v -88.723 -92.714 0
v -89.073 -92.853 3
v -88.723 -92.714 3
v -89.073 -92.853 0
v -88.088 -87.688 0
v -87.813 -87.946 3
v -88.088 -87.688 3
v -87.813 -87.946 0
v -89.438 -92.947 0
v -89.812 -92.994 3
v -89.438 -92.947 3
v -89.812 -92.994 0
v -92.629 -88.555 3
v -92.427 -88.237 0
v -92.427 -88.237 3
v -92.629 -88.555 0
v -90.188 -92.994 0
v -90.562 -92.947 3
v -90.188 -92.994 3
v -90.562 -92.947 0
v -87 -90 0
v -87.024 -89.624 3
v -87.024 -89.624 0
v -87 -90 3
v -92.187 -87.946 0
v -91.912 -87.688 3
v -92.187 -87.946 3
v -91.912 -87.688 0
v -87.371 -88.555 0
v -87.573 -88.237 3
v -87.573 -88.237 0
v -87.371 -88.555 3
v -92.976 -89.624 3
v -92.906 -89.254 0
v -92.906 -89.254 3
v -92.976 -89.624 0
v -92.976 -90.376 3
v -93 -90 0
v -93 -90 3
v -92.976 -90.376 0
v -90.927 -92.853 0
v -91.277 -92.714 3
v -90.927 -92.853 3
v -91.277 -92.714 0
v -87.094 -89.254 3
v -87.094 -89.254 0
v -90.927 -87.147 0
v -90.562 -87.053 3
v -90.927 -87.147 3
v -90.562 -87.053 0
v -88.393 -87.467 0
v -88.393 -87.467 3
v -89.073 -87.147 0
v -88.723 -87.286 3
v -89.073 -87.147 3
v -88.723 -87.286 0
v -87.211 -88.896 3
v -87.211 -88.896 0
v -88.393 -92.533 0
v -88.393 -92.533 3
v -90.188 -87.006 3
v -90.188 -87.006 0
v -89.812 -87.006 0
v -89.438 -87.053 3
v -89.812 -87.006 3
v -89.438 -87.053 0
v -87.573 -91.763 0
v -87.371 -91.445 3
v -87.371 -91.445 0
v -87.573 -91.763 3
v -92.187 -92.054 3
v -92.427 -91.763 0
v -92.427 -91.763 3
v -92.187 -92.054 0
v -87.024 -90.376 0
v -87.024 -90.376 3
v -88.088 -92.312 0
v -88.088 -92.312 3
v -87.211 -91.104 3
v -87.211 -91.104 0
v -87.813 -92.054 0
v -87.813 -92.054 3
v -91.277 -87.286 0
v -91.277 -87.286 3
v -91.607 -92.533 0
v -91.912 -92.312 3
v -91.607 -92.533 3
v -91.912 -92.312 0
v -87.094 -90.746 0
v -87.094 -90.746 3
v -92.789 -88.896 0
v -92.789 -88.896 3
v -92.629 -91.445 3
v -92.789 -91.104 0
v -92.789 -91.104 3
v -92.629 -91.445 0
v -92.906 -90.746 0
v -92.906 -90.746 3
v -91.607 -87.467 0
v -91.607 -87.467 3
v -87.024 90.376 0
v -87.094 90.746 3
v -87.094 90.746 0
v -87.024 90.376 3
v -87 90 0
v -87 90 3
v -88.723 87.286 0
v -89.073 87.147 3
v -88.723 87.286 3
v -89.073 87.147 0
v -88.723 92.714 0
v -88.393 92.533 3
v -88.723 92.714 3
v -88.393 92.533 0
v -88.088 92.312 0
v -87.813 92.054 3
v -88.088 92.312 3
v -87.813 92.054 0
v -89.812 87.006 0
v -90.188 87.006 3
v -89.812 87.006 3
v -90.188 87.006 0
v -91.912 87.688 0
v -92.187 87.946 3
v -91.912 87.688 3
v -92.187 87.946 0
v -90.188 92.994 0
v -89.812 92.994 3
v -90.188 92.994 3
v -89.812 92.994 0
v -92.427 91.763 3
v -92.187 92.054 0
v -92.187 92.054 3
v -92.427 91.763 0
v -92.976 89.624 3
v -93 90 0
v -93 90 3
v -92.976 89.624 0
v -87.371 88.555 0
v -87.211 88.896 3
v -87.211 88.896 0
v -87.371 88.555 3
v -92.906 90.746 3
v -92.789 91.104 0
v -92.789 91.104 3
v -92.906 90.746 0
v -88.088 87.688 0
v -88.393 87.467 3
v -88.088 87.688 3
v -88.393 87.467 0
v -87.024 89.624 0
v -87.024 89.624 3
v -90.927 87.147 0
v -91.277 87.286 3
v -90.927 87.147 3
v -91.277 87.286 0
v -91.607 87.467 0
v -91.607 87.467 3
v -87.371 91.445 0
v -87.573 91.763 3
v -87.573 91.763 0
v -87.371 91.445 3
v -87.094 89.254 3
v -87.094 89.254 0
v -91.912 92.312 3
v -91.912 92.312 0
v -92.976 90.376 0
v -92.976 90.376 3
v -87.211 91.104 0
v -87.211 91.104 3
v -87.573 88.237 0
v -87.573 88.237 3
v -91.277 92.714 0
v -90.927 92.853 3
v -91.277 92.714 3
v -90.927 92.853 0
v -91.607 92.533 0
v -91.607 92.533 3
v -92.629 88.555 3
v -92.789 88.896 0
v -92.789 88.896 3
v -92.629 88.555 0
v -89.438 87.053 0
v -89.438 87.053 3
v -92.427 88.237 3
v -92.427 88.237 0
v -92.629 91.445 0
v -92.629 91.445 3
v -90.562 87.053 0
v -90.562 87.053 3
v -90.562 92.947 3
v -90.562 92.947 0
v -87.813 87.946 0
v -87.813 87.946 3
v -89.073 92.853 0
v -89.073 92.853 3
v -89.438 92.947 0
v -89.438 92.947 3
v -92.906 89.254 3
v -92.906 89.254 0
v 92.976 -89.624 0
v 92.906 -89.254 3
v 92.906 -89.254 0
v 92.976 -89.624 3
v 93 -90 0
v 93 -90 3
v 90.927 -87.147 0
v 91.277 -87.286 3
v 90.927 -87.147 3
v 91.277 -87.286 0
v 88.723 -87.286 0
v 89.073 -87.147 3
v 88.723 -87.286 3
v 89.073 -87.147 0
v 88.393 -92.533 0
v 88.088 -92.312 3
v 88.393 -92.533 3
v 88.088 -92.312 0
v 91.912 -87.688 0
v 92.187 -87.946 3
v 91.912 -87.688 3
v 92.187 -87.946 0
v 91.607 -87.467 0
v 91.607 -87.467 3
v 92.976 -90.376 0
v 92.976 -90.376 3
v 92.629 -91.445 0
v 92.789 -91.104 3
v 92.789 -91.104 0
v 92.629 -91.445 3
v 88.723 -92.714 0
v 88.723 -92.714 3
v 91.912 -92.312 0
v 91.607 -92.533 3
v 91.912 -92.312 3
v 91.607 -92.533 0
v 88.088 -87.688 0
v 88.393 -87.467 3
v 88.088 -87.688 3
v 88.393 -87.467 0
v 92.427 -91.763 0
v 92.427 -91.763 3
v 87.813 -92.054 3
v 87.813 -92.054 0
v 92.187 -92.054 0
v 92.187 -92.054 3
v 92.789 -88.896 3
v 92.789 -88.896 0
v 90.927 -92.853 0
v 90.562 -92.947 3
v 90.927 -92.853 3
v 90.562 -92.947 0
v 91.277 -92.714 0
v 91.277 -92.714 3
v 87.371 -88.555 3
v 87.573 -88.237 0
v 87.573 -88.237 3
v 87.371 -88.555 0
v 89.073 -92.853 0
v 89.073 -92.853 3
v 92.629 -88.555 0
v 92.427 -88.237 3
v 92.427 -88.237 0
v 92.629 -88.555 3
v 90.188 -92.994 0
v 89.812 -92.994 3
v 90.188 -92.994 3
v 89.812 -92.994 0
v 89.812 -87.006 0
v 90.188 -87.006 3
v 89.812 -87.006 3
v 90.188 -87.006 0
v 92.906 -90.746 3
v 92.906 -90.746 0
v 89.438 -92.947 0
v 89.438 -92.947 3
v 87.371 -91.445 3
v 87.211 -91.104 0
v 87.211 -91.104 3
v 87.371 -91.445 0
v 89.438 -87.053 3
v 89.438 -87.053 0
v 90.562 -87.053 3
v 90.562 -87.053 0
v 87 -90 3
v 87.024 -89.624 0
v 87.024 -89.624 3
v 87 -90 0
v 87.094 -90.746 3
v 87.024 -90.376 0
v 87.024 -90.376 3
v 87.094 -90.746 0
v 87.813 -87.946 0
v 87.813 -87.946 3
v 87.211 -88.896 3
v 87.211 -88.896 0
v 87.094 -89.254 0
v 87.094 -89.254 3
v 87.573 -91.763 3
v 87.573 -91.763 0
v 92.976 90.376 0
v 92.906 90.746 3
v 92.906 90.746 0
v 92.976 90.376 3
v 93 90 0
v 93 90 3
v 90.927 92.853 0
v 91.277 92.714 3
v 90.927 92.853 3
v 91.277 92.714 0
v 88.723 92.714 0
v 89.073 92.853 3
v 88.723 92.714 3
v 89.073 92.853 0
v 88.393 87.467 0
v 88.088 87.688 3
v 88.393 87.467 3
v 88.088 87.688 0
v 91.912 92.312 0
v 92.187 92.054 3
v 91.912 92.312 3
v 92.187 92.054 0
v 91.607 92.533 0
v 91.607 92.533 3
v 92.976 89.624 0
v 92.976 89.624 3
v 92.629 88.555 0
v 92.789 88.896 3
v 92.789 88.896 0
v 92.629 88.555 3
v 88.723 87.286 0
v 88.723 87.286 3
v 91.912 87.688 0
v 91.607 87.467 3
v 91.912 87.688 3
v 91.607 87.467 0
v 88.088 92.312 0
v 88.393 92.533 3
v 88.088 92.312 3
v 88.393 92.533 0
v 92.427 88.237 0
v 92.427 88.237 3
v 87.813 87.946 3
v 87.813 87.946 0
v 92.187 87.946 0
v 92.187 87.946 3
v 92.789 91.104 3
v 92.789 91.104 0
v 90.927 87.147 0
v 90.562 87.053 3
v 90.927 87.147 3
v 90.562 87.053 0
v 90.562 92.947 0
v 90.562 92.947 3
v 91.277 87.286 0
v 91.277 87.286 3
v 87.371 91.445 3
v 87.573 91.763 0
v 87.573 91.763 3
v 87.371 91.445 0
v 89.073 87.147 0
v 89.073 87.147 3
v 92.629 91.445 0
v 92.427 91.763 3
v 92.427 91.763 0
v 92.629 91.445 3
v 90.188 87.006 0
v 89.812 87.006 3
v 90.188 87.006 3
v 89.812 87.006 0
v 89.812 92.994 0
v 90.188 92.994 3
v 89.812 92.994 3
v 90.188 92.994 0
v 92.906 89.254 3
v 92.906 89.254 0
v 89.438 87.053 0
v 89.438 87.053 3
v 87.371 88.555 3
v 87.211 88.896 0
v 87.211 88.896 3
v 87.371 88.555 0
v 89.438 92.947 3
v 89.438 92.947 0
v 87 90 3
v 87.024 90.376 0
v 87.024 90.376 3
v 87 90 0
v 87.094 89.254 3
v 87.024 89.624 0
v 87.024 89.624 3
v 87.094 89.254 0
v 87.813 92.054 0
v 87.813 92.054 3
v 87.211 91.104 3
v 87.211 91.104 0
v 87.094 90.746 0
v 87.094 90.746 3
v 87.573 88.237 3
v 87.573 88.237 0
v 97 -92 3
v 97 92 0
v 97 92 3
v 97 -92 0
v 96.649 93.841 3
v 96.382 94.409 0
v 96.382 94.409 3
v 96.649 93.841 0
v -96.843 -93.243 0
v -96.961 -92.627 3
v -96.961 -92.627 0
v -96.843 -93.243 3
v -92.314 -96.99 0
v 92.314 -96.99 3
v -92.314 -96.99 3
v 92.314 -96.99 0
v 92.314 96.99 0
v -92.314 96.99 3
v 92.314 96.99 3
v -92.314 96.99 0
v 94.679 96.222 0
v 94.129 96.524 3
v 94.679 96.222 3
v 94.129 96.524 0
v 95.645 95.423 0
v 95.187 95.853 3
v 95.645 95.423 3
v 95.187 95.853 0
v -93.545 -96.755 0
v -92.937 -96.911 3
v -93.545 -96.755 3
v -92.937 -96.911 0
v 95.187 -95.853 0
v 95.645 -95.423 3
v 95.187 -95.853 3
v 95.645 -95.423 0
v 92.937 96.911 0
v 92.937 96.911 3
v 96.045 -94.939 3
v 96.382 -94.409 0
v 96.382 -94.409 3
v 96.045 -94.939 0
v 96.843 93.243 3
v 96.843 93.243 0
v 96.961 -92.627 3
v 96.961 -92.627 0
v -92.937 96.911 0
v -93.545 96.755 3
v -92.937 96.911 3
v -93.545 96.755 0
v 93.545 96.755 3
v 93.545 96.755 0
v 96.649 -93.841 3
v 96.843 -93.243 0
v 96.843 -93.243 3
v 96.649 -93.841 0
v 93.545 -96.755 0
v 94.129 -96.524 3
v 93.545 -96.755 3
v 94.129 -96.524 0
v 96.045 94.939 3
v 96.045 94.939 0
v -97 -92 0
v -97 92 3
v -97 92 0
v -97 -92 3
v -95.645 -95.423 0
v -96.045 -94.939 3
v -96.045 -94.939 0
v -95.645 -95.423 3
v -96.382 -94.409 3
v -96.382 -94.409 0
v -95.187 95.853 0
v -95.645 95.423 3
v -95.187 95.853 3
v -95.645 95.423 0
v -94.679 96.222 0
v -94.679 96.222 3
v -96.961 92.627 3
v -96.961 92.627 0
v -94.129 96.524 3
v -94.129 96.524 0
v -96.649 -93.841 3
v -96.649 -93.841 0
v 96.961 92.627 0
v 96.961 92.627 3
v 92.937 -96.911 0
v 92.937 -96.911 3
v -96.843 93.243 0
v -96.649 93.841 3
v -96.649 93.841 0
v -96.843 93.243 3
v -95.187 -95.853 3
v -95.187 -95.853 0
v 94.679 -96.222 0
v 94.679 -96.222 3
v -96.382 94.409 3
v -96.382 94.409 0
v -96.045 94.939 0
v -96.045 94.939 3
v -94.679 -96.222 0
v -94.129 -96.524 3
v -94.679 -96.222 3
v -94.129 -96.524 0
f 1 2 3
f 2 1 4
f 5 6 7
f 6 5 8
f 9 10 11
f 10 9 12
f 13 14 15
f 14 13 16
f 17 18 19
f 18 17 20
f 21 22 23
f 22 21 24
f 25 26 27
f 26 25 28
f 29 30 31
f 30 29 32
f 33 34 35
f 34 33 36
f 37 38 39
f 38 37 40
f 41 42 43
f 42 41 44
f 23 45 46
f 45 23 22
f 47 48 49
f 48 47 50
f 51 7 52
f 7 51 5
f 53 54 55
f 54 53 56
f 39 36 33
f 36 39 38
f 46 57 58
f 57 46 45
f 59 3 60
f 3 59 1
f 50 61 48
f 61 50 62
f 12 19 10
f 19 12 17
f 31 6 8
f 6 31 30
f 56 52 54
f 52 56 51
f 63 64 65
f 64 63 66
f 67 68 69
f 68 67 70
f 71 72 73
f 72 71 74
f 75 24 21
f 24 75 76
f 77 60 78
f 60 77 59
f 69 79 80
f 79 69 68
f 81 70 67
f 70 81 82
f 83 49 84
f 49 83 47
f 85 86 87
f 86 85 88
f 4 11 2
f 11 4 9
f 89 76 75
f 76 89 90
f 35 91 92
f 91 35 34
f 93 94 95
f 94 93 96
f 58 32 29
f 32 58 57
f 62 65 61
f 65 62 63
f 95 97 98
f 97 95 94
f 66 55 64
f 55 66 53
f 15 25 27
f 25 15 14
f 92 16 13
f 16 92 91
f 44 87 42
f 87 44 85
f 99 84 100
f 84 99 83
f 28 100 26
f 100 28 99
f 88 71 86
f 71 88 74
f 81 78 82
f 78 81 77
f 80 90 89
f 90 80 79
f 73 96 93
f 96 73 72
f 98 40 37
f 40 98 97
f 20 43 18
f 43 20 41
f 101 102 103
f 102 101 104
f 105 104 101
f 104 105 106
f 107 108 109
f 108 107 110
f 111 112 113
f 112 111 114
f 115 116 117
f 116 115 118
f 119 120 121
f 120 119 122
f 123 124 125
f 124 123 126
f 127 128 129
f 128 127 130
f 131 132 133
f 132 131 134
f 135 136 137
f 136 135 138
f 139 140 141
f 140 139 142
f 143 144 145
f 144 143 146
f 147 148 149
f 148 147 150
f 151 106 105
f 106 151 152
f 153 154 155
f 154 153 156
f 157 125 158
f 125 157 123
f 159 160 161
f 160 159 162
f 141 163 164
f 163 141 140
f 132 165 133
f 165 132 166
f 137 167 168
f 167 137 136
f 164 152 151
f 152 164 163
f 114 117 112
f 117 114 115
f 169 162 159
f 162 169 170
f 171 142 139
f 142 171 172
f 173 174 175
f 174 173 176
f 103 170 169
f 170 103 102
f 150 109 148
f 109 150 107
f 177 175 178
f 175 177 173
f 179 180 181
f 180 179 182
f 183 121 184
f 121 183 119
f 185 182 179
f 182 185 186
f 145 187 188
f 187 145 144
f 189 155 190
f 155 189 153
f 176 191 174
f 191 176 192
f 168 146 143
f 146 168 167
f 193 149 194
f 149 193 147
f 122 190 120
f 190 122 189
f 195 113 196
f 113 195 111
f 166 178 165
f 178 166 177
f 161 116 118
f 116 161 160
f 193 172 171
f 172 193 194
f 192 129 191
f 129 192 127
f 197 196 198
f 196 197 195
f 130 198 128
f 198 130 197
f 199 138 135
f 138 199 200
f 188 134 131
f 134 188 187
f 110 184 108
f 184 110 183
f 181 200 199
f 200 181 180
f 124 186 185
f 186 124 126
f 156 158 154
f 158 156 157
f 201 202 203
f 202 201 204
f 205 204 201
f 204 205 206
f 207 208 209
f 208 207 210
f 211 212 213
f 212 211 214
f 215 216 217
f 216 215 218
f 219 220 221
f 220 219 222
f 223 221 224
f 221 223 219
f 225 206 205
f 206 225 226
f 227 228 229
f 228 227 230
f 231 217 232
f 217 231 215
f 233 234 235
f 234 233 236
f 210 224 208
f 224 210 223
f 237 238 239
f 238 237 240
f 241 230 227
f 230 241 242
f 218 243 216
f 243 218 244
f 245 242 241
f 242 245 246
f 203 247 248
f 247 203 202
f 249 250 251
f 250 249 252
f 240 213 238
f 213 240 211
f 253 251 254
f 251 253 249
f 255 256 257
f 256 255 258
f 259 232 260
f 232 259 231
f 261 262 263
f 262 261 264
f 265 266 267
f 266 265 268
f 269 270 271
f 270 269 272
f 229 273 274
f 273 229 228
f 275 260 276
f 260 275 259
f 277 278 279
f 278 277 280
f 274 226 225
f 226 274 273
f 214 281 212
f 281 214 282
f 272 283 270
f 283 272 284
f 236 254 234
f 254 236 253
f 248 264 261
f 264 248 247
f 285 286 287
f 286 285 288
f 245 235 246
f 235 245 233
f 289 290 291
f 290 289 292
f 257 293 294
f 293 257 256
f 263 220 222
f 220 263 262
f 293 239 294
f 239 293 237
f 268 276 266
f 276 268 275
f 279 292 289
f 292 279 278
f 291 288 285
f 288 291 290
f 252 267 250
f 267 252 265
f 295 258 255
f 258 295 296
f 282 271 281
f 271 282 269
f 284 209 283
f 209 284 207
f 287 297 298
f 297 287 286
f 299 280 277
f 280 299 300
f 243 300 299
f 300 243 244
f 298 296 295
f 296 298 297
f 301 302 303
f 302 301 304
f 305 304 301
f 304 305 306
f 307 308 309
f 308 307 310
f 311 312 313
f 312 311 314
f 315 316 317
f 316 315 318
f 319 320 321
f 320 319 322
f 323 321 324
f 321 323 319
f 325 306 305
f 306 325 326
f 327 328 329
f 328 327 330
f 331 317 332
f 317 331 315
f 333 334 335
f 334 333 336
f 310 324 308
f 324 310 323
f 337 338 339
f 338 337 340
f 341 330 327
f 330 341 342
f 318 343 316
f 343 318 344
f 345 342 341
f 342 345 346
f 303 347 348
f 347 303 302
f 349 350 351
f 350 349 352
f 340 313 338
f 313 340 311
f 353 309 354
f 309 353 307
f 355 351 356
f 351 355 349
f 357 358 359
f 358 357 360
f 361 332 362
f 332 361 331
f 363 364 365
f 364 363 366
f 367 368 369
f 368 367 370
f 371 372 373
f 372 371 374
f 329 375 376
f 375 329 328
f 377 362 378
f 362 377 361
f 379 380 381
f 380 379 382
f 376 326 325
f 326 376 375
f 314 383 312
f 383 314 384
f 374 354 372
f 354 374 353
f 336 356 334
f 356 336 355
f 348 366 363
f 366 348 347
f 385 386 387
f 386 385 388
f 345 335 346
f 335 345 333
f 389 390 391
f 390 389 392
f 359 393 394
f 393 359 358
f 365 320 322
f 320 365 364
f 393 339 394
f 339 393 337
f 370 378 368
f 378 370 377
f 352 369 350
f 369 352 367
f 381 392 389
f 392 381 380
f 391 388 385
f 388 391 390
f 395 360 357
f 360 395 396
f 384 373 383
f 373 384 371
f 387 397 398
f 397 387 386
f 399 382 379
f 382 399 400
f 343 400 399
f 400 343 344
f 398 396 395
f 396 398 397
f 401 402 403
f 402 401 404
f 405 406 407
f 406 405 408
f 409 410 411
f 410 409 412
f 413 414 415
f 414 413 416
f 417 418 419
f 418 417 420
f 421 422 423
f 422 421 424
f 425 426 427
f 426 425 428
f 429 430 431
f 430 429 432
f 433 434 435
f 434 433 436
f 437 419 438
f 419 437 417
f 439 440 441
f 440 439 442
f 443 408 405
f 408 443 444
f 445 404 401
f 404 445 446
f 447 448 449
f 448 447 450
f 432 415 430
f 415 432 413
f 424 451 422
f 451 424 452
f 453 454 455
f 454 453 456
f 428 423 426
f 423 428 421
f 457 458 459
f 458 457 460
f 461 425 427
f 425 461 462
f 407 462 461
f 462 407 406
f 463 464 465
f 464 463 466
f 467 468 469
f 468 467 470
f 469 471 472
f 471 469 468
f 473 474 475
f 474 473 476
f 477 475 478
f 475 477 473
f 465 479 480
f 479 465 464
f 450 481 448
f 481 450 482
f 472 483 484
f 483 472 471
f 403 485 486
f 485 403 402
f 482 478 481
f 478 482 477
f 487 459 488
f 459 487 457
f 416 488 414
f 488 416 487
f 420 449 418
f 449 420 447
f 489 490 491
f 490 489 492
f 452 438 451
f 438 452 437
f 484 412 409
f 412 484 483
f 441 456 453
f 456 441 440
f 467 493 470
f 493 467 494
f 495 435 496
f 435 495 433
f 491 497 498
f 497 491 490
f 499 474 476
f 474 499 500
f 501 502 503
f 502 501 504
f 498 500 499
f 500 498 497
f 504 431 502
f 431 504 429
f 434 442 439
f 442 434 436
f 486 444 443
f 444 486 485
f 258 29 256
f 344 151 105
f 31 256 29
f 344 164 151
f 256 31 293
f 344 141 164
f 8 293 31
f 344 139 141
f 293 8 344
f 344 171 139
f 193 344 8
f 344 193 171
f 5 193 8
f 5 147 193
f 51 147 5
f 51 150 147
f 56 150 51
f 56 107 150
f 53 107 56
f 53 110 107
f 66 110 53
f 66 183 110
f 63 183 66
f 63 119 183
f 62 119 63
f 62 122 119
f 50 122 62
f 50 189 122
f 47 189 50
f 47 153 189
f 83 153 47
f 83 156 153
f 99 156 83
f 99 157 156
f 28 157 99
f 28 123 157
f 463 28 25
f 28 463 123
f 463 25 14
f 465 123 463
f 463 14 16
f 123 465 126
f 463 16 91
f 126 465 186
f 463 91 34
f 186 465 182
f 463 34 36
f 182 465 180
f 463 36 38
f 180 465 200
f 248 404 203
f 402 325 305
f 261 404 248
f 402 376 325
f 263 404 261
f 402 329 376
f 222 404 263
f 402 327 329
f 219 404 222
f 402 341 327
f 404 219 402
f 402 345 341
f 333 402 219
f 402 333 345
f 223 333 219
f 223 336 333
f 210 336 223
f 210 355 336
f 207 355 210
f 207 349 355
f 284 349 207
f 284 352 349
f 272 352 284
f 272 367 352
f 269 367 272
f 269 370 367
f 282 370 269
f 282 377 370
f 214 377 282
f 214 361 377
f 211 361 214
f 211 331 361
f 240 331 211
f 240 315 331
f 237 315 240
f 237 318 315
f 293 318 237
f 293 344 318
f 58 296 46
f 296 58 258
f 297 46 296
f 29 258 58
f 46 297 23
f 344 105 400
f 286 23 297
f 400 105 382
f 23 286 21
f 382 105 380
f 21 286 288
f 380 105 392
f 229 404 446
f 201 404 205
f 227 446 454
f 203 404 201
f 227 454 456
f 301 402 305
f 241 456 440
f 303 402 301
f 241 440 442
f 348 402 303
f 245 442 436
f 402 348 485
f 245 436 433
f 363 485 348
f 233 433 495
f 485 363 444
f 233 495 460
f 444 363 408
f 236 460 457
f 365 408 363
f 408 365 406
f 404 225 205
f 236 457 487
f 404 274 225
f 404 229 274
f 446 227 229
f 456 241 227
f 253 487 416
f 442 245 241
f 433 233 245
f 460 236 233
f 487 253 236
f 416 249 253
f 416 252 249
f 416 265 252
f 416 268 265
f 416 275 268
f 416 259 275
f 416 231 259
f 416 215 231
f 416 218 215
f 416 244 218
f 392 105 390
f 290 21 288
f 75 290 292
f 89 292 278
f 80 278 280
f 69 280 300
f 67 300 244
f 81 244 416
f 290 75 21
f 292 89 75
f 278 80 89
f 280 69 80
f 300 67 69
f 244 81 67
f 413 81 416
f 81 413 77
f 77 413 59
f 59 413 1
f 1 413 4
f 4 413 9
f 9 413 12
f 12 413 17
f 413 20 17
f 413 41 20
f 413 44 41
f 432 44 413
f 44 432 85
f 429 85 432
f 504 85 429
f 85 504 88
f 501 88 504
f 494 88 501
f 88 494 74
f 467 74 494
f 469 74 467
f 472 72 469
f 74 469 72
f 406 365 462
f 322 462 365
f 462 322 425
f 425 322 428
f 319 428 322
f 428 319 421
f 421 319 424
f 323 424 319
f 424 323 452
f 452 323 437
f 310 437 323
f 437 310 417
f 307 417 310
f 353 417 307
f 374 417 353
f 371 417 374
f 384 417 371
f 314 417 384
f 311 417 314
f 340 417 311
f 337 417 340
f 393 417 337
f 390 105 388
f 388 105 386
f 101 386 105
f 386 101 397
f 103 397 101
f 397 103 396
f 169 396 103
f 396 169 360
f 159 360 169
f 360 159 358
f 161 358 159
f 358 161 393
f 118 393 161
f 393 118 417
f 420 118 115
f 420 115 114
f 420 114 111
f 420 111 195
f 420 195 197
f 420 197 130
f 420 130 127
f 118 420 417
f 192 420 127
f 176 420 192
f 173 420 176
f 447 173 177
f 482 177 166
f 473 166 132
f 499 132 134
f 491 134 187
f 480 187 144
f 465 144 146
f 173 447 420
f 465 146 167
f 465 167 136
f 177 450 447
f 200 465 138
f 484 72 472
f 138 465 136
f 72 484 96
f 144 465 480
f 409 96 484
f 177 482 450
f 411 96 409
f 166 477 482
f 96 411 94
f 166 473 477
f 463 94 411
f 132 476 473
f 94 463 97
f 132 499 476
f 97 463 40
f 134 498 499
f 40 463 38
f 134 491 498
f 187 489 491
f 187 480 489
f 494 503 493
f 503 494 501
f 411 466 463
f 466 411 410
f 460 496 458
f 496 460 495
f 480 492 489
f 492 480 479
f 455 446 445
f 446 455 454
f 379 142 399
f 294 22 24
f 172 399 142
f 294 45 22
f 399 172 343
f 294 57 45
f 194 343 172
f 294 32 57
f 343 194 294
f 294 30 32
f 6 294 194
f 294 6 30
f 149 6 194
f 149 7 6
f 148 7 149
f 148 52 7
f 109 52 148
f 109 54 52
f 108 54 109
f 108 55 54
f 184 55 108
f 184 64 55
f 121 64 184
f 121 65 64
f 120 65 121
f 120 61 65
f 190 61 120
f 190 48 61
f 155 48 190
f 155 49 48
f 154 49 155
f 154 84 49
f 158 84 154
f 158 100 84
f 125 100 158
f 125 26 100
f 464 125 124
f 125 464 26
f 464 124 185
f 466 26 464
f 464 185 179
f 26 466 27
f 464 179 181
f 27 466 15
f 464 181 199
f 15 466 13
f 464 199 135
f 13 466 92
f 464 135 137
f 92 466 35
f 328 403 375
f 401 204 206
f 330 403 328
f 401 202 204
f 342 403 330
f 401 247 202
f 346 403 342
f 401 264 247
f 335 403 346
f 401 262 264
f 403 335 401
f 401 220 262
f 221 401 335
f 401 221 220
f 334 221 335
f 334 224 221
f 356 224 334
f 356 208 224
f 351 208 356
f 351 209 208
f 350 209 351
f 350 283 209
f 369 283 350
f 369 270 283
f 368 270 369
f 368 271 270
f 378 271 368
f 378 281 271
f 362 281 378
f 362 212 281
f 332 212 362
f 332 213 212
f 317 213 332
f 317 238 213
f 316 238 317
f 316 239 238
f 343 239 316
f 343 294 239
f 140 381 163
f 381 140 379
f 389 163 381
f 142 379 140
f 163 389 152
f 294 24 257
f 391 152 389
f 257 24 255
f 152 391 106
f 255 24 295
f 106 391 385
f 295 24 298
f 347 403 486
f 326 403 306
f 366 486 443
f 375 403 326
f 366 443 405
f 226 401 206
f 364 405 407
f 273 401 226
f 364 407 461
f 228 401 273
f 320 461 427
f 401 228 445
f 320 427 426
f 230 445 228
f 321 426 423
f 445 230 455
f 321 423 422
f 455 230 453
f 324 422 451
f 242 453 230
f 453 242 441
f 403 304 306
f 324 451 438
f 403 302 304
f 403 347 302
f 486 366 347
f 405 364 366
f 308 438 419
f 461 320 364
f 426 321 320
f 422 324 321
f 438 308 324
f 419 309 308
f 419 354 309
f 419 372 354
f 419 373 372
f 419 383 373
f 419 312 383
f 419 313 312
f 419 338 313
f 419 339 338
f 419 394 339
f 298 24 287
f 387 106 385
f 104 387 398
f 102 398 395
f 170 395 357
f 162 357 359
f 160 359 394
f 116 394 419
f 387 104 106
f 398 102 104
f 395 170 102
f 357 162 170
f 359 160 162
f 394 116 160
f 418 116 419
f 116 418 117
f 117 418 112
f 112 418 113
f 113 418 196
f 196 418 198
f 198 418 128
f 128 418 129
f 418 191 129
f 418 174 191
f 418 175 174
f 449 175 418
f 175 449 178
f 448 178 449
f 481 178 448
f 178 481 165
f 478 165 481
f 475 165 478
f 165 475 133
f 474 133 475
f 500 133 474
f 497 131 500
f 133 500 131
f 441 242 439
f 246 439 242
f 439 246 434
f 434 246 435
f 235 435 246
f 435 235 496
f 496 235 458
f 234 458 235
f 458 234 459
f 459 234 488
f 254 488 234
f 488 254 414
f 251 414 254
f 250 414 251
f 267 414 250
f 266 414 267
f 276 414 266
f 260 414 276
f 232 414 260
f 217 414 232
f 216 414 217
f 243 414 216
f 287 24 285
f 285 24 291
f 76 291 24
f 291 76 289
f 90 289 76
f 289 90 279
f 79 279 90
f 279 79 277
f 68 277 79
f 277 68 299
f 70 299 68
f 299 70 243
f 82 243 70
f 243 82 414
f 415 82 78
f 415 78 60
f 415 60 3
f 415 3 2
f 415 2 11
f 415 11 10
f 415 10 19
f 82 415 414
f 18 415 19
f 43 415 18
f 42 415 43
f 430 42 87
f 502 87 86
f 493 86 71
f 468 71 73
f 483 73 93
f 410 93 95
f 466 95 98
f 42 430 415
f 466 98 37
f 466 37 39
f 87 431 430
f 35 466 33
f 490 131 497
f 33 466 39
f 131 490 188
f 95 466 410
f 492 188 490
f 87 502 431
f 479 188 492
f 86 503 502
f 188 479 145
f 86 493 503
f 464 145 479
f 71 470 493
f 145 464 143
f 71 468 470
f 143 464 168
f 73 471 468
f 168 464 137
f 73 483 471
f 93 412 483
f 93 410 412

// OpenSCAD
$fn = 50;


difference() {
	union() {
		hull() {
			translate(v = [-92.0000000000, 92.0000000000, 0]) {
				cylinder(h = 3, r = 5);
			}
			translate(v = [92.0000000000, 92.0000000000, 0]) {
				cylinder(h = 3, r = 5);
			}
			translate(v = [-92.0000000000, -92.0000000000, 0]) {
				cylinder(h = 3, r = 5);
			}
			translate(v = [92.0000000000, -92.0000000000, 0]) {
				cylinder(h = 3, r = 5);
			}
		}
	}
	union() {
		translate(v = [-90.0000000000, -90.0000000000, -100.0000000000]) {
			cylinder(h = 200, r = 3.0000000000);
		}
		translate(v = [-90.0000000000, 90.0000000000, -100.0000000000]) {
			cylinder(h = 200, r = 3.0000000000);
		}
		translate(v = [90.0000000000, -90.0000000000, -100.0000000000]) {
			cylinder(h = 200, r = 3.0000000000);
		}
		translate(v = [90.0000000000, 90.0000000000, -100.0000000000]) {
			cylinder(h = 200, r = 3.0000000000);
		}
	}
}
